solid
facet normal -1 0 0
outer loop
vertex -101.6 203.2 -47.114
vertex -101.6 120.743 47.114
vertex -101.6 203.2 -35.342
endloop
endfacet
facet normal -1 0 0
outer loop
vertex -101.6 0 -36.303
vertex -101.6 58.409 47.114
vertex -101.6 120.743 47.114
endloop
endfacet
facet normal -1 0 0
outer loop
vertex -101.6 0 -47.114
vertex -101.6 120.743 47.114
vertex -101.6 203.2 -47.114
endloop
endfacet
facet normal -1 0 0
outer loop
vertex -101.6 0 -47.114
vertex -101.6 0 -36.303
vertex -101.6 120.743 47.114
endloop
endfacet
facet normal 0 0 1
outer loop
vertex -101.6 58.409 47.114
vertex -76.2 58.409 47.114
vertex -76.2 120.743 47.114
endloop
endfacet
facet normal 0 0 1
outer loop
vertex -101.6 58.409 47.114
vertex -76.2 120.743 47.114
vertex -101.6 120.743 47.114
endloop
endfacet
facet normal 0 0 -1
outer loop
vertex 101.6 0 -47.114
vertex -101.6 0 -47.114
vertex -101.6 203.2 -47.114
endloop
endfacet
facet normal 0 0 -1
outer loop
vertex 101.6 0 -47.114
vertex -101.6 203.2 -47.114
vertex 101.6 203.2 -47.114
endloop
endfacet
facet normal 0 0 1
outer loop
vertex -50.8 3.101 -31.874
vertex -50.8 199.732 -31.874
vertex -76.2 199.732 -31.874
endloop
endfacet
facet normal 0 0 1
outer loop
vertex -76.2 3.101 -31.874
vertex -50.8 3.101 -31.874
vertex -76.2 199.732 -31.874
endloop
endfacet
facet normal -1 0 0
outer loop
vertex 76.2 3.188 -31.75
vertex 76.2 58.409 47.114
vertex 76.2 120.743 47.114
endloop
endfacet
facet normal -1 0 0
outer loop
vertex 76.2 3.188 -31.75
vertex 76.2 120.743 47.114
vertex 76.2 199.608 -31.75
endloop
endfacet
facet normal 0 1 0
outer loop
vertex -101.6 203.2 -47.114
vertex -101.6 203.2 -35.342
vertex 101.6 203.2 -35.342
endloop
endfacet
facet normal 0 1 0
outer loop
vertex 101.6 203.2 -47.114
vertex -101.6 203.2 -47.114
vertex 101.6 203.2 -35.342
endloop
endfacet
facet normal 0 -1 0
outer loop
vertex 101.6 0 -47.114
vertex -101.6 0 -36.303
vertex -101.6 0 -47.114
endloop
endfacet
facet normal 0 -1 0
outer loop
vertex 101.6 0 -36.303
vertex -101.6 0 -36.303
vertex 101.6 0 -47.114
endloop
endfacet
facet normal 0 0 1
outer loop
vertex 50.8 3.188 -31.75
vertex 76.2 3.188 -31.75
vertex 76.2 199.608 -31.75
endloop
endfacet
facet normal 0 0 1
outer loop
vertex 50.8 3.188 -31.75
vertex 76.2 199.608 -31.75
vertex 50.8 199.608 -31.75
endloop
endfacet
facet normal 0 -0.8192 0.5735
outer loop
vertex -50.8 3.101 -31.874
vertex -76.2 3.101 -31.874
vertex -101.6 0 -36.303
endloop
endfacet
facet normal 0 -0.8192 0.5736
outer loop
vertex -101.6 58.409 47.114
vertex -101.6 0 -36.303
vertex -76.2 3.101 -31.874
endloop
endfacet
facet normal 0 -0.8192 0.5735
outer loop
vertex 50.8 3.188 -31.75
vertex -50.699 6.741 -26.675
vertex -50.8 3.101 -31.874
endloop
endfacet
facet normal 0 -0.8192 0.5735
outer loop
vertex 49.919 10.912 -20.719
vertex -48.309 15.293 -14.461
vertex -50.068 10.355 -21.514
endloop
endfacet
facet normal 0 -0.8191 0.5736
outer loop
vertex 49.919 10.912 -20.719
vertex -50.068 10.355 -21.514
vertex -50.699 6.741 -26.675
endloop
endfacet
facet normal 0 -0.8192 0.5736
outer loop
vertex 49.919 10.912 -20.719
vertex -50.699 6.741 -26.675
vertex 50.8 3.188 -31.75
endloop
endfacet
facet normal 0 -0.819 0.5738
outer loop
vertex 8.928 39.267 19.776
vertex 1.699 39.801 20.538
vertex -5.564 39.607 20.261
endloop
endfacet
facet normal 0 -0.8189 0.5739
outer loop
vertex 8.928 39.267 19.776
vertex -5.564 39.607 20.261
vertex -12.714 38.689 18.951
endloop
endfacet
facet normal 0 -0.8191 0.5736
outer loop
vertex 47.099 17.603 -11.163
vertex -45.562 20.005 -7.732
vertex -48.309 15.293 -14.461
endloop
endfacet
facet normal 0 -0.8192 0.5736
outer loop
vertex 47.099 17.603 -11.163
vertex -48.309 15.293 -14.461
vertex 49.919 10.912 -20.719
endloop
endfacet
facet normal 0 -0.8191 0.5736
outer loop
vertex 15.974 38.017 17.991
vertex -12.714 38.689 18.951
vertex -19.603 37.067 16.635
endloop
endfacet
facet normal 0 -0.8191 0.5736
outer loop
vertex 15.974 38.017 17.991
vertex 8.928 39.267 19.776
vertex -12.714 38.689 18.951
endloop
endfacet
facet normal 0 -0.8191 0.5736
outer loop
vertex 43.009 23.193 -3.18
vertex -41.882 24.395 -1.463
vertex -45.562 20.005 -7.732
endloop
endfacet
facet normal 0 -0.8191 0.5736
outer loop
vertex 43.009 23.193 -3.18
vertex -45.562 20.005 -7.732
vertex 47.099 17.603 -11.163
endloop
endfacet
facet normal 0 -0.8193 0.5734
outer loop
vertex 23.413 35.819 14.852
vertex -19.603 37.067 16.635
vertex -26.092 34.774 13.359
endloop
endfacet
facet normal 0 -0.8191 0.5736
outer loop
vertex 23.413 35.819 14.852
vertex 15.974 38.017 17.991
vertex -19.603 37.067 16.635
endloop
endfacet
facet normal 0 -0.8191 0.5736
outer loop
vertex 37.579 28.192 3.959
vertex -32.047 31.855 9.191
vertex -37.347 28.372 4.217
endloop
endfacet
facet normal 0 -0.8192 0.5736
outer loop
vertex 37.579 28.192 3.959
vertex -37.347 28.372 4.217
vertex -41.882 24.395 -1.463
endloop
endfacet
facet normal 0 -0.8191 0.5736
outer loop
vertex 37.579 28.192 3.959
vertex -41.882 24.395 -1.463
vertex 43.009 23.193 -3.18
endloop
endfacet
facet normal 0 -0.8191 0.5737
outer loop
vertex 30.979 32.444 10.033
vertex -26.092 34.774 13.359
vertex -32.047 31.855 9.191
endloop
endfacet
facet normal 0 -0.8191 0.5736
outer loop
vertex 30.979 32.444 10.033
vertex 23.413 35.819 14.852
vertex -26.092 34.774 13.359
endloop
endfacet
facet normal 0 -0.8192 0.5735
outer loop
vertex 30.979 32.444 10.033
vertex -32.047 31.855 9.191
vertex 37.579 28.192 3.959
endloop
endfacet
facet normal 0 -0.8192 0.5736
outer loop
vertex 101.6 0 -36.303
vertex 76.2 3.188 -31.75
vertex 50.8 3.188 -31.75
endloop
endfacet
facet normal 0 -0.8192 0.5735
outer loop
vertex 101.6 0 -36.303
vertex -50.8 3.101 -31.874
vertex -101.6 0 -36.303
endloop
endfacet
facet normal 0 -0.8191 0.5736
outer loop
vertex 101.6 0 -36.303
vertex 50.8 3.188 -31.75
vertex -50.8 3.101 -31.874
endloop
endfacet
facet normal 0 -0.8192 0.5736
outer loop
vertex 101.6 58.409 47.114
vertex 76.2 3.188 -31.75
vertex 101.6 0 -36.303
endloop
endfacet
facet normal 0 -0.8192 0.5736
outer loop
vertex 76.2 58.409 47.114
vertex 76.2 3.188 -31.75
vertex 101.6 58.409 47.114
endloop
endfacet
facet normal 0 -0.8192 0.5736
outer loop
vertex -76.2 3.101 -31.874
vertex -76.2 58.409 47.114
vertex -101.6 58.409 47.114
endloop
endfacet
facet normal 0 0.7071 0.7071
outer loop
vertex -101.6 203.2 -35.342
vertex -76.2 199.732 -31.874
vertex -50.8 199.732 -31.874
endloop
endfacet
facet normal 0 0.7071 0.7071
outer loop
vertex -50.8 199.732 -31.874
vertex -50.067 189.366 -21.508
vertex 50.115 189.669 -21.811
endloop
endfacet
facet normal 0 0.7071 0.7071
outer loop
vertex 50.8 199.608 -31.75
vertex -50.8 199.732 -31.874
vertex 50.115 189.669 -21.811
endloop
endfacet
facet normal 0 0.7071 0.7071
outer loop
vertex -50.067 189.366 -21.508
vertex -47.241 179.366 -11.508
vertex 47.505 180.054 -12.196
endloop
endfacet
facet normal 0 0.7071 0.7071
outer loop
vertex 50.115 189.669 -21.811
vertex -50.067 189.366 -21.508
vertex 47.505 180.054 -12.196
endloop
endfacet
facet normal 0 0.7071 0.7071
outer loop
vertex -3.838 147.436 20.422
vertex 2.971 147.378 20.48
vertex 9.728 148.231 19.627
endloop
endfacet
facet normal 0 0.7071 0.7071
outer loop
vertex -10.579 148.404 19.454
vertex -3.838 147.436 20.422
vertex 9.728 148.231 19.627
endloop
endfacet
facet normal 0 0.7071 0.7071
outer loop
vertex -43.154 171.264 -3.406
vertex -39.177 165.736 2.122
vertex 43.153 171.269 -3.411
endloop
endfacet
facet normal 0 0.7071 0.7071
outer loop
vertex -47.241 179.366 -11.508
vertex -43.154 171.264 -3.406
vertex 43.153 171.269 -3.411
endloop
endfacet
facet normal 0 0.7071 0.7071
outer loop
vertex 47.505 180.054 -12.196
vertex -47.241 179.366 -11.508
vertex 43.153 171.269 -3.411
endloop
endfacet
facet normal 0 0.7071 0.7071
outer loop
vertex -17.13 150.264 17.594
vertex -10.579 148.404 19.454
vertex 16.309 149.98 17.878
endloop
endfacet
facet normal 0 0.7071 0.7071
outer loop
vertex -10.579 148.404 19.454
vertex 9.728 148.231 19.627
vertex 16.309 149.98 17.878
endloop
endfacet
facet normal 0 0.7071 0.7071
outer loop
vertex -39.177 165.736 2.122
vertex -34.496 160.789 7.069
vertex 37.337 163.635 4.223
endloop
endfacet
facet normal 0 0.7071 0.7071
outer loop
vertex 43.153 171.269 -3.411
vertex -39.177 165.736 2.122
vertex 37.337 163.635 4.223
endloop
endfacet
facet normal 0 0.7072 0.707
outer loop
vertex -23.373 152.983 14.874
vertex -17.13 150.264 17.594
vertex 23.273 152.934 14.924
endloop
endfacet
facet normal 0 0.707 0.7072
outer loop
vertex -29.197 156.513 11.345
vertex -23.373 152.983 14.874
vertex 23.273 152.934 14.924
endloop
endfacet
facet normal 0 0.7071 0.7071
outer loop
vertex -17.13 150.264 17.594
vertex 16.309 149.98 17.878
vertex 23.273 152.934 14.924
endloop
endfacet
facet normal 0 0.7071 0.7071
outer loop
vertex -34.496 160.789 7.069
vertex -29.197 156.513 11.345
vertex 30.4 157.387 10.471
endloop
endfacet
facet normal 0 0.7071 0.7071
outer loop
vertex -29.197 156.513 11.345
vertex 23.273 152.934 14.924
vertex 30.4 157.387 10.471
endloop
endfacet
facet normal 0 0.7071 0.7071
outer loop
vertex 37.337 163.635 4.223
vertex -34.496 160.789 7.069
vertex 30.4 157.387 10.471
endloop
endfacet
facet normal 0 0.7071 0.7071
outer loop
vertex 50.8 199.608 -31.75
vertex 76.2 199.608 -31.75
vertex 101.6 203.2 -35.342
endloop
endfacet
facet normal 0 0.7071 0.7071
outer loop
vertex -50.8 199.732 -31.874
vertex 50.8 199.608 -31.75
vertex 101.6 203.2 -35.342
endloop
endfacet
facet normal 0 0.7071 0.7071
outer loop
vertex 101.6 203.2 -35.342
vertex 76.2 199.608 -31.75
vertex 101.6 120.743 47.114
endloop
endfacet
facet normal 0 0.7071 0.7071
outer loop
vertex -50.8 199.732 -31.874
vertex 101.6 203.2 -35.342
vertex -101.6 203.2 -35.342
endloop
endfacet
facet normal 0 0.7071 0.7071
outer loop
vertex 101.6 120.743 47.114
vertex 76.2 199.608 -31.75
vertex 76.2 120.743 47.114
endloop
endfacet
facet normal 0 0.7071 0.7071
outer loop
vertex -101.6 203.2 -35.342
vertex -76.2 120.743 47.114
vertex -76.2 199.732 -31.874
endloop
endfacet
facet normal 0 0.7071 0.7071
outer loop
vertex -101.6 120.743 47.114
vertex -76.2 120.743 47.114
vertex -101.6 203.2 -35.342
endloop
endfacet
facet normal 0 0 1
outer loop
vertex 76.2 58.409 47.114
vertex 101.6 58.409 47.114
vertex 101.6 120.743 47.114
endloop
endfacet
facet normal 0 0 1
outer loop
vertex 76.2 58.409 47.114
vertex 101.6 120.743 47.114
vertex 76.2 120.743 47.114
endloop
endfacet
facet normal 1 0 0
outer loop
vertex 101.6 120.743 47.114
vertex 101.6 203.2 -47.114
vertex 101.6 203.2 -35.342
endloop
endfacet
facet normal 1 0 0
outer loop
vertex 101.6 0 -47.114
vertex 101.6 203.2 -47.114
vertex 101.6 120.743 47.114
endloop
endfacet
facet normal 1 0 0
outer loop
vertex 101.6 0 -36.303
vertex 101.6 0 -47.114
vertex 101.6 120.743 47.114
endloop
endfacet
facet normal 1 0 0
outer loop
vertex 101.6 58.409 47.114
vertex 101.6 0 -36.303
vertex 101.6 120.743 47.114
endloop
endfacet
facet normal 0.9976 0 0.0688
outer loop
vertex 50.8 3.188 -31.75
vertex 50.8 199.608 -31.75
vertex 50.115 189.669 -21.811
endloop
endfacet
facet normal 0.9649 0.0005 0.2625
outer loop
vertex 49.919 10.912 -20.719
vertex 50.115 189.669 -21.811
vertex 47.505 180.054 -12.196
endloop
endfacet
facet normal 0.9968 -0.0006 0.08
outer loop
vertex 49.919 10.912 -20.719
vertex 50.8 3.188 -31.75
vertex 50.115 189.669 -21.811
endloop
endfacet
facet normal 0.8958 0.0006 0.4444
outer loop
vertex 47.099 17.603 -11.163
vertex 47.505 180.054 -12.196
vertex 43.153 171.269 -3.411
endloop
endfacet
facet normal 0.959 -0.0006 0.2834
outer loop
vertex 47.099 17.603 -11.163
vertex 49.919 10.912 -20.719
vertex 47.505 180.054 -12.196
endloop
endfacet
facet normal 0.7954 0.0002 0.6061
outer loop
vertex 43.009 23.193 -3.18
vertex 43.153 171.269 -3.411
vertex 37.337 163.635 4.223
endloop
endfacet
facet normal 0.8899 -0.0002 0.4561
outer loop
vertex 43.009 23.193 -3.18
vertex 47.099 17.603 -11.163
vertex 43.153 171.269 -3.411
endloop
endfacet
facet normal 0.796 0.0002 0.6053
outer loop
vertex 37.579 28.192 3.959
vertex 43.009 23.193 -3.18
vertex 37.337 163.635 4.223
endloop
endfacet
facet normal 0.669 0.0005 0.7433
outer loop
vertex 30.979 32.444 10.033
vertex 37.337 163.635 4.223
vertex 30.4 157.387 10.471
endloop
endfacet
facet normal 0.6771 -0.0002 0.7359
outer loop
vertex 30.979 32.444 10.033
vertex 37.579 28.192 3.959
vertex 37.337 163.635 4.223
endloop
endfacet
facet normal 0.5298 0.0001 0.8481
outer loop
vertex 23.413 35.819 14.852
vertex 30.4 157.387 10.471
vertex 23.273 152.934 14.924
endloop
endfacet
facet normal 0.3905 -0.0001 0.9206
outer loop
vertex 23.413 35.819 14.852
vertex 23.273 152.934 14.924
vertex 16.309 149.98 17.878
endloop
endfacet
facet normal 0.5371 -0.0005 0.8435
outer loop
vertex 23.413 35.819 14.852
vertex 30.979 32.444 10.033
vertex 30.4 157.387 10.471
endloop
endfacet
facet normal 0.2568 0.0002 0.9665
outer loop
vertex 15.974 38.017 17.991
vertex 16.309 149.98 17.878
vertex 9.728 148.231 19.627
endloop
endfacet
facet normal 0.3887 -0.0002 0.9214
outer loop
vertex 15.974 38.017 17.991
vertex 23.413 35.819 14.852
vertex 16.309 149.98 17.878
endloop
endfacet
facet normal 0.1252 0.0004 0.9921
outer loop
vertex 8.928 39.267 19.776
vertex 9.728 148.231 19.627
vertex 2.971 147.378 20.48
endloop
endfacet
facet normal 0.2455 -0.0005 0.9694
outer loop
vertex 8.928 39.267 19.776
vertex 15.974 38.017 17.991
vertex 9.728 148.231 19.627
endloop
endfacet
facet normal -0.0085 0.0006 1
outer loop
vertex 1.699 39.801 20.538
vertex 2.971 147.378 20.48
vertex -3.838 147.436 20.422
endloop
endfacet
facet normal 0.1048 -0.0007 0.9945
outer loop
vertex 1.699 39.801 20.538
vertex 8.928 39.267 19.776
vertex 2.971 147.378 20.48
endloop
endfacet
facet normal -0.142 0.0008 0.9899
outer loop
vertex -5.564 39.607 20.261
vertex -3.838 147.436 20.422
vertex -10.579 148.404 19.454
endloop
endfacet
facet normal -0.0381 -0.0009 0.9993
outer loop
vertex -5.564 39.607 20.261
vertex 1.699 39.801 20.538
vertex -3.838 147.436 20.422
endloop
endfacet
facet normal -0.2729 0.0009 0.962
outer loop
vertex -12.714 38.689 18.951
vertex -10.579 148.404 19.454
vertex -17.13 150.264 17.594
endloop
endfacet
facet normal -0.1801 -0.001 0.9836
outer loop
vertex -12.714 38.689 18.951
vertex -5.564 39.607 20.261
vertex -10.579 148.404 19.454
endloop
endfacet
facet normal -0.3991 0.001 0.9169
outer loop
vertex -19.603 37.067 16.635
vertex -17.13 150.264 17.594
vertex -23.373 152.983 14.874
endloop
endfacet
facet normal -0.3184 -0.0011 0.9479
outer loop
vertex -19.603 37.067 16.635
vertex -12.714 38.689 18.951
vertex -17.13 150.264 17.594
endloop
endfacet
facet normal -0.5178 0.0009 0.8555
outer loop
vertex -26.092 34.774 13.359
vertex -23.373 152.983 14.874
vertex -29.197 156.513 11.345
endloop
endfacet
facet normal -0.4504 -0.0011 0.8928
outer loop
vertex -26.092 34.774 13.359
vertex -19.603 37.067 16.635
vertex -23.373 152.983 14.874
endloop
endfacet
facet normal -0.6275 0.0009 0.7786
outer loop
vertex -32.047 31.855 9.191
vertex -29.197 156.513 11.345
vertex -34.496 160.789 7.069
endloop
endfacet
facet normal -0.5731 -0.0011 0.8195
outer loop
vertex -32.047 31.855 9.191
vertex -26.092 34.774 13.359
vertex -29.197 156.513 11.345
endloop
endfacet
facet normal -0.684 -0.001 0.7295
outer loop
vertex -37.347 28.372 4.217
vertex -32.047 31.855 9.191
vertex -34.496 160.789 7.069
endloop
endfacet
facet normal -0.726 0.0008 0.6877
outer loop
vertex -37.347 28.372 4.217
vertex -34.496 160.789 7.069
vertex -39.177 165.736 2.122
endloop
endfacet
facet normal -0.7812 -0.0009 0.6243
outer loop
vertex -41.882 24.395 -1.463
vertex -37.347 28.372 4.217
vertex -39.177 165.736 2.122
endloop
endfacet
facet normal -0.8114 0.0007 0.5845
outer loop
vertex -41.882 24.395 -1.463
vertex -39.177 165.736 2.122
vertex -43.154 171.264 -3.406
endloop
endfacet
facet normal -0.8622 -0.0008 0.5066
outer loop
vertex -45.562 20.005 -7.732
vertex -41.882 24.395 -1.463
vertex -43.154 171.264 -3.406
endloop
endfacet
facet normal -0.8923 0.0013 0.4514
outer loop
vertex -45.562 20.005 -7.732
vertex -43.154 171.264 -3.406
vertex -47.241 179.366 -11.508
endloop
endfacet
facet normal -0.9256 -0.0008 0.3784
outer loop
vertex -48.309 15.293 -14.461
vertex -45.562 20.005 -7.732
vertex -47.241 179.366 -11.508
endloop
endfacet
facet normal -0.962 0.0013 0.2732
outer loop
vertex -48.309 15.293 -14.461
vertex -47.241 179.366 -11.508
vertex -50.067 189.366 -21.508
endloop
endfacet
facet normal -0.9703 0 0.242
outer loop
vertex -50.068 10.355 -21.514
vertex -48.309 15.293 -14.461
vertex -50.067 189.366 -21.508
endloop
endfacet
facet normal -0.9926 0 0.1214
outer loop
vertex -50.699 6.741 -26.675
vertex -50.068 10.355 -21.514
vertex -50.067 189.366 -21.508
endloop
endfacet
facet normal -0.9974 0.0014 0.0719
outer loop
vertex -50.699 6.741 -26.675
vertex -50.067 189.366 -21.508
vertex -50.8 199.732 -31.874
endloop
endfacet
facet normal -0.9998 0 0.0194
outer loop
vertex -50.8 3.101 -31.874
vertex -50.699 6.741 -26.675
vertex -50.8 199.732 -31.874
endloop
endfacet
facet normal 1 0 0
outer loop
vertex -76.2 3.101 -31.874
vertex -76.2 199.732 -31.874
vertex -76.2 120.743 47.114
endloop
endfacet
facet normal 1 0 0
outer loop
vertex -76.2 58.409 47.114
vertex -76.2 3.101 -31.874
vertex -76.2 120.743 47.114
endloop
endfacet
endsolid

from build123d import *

# Parameters (mm, degrees)
F1_DEPTH  = 203.2
F3_W      = 243.94399
F3_H      = 236.642776
F4_DEPTH  = 50.8
F5_W      = 239.845752
F5_H      = 209.126156
F6_DEPTH  = 2.54
F8_W      = 249.582366
F8_H      = 241.68387
F9_DEPTH  = 76.2
F10_W     = 220.484912
F10_H     = 208.068371
F11_DEPTH = 2.54


with BuildPart() as f1:
    # F0 (on Front) → F1 (new body)
    with BuildSketch(Plane.XZ):
        with BuildLine():
            Line((-101.6, -47.114426), (101.6, -47.114426))
            Line((101.6, -47.114426), (101.6, 47.114426))
            Line((101.6, 47.114426), (76.2, 47.114426))
            Line((76.2, 47.114426), (76.2, -31.75))
            Line((76.2, -31.75), (50.8, -31.75))
            ThreePointArc((50.8, -31.75), (-0.064147, 20.566733), (-50.8, -31.874426))
            Line((-50.8, -31.874426), (-76.2, -31.874426))
            Line((-76.2, -31.874426), (-76.2, 47.114426))
            Line((-76.2, 47.114426), (-101.6, 47.114426))
            Line((-101.6, 47.114426), (-101.6, -31.874426))
            Line((-101.6, -31.874426), (-101.6, -47.114426))
        make_face()
    extrude(amount=-F1_DEPTH)

    # F3 (on face) → F4 (cut)
    with BuildSketch(Plane(origin=(0, 14.976081, -10.486365), x_dir=(1, 0, 0), z_dir=(0, -0.819152, 0.573576))):
        with Locations((0, 12.914947)):
            Rectangle(F3_W, F3_H)
    extrude(amount=F4_DEPTH, mode=Mode.SUBTRACT)

    # F5 (on face) → F6 (cut)
    with BuildSketch(Plane(origin=(0, 14.976081, -10.486365), x_dir=(1, 0, 0), z_dir=(0, -0.819152, 0.573576))):
        with Locations((0, 12.164494)):
            Rectangle(F5_W, F5_H)
    extrude(amount=-F6_DEPTH, mode=Mode.SUBTRACT)

    # F8 (on face) → F9 (cut)
    with BuildSketch(Plane(origin=(0, 85.725, 85.725), x_dir=(1, 0, 0), z_dir=(0, -0.707107, -0.707107))):
        with Locations((0, -104.242772)):
            Rectangle(F8_W, F8_H)
    extrude(amount=-F9_DEPTH, mode=Mode.SUBTRACT)

    # F10 (on face) → F11 (cut)
    with BuildSketch(Plane(origin=(0, 85.725, 85.725), x_dir=(1, 0, 0), z_dir=(0, -0.707107, -0.707107))):
        with Locations((0, -103.083611)):
            Rectangle(F10_W, F10_H)
    extrude(amount=F11_DEPTH, mode=Mode.SUBTRACT)


solid = f1.part
